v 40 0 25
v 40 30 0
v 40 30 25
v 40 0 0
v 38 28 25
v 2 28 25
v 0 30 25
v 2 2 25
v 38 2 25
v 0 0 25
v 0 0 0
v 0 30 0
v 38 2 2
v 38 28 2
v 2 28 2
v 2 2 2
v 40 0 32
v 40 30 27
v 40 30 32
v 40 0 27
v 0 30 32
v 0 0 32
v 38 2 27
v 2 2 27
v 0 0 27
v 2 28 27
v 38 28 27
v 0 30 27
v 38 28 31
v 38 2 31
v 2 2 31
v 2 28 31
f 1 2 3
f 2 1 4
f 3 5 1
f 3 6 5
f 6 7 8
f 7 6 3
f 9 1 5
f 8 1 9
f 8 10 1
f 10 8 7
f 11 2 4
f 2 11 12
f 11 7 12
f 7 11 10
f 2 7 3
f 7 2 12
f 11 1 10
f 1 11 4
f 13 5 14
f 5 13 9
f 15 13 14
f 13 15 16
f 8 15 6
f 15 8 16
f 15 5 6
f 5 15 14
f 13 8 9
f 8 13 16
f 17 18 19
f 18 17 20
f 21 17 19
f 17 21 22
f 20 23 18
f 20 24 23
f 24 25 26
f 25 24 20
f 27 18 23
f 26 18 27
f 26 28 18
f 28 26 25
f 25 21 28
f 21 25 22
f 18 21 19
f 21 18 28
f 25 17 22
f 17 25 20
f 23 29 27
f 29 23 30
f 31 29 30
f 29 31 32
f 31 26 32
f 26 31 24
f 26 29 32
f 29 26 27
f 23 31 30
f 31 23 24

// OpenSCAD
// Parametric Box with Lid
// A simple parametric box from Thingiverse

/* [Box Dimensions] */
width = 40;           // [10:100] Box width
depth = 30;           // [10:80] Box depth
height = 25;          // [10:50] Box height
wall = 2;             // [1:5] Wall thickness

/* [Options] */
show_lid = true;      //
lid_height = 5;       // [3:15] Lid height
rounded = false;      //

// Box body
difference() {
    cube([width, depth, height]);
    translate([wall, wall, wall])
        cube([width - 2*wall, depth - 2*wall, height]);
}

// Lid
if (show_lid) {
    translate([0, 0, height + 2])
        difference() {
            cube([width, depth, lid_height]);
            translate([wall, wall, -1])
                cube([width - 2*wall, depth - 2*wall, lid_height]);
        }
}
